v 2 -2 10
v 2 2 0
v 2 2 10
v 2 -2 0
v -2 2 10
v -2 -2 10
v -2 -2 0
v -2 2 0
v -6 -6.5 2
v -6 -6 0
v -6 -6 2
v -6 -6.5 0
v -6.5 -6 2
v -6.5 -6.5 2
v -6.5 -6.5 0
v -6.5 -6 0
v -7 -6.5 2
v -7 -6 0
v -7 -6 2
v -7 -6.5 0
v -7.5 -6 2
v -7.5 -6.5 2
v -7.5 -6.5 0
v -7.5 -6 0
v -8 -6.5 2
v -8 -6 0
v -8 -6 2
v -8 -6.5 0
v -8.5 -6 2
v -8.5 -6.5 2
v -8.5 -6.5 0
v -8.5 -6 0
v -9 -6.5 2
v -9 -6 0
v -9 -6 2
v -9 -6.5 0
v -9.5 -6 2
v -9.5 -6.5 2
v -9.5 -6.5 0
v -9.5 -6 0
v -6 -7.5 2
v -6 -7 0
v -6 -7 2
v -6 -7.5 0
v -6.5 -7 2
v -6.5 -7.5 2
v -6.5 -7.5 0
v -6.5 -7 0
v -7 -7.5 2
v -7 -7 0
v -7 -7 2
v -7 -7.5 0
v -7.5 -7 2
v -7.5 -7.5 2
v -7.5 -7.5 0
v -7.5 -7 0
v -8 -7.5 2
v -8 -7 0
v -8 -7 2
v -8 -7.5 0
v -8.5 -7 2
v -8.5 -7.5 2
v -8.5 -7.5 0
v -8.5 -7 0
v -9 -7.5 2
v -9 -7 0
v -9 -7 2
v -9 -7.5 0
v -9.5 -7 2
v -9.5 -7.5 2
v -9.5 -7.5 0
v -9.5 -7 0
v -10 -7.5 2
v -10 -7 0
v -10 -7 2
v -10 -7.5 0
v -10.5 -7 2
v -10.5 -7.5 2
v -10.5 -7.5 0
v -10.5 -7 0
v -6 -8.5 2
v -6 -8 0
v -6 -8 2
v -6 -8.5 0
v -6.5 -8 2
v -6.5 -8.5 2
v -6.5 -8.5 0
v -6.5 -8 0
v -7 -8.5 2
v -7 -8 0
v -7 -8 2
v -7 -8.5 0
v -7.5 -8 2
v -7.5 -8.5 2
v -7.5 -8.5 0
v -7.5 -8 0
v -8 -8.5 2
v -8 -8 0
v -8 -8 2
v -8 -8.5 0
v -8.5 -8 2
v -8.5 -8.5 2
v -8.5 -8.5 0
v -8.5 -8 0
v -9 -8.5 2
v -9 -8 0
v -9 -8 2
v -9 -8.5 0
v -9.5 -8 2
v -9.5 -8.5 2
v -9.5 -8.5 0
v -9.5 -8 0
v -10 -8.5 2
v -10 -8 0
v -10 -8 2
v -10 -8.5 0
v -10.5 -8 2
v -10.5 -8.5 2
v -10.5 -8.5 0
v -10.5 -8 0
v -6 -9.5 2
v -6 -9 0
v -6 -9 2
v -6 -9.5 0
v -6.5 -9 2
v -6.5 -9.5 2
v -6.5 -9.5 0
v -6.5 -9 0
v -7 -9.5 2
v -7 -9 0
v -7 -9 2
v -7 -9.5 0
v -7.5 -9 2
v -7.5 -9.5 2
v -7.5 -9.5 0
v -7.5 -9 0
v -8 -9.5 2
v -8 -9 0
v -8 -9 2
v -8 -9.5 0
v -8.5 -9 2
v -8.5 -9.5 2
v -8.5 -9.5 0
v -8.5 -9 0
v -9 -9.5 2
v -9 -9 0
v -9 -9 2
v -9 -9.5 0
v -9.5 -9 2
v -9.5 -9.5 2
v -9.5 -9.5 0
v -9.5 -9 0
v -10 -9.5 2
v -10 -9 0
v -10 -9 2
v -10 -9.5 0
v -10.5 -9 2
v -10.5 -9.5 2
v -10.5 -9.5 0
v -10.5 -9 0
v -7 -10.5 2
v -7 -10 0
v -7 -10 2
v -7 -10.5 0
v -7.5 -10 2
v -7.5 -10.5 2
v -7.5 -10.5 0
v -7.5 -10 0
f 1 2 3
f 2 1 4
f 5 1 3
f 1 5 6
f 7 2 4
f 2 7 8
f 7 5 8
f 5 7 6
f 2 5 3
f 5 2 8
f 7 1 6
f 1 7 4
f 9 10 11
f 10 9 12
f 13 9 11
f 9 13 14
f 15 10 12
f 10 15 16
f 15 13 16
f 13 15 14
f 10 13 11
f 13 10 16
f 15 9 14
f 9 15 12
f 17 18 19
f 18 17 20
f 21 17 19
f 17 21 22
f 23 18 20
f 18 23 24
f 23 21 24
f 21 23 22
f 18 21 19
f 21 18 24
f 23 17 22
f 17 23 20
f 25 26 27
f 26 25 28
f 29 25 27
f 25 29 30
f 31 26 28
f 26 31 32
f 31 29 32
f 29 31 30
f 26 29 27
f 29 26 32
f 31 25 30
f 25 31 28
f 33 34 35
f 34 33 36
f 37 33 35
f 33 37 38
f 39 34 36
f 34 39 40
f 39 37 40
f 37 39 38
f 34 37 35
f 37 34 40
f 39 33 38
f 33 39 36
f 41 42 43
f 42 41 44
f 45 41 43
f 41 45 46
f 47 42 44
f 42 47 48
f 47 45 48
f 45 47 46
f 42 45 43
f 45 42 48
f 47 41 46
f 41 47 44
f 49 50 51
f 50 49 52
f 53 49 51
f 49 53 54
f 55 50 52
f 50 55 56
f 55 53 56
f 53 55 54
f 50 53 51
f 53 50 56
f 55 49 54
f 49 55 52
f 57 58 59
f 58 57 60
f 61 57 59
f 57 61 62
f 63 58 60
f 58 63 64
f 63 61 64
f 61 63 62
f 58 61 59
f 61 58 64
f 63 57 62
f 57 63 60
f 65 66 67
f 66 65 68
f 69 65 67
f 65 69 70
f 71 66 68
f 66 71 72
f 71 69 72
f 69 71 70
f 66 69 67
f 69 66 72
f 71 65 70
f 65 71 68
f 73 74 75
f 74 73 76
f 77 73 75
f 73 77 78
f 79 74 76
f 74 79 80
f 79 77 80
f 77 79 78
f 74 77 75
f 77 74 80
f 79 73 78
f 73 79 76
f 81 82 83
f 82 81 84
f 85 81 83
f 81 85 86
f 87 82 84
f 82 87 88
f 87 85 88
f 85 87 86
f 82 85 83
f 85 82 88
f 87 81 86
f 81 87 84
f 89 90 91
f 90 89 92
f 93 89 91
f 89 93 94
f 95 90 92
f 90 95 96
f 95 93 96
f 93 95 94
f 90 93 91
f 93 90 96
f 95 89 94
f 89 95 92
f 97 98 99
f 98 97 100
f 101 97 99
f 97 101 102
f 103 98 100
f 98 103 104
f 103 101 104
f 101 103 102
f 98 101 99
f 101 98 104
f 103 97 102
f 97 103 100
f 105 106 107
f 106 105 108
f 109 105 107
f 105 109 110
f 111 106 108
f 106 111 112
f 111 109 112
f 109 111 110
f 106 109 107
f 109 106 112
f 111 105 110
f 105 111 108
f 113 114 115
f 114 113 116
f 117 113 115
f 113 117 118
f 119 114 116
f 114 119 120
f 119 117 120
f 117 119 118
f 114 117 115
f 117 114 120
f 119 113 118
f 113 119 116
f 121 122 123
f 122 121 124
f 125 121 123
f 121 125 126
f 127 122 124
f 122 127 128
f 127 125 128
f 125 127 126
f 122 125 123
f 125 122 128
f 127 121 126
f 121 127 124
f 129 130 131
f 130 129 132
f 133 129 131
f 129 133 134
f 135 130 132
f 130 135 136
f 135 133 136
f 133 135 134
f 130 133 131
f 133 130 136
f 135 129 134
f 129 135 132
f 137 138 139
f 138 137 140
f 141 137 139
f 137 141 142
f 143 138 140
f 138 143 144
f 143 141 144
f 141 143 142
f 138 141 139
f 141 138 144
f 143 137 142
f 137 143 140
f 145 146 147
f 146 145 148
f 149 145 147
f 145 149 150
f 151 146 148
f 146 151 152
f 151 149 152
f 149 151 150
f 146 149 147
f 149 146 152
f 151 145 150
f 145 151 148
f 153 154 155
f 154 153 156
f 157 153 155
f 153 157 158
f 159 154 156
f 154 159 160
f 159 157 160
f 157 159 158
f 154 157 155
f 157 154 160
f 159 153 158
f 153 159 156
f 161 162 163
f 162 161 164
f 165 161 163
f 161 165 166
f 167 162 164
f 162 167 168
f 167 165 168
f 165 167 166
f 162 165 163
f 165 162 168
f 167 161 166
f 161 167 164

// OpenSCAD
translate([0, 0, 5]) color([0,1,0,0.9]) cube([4, 4, 10], center=true);
translate([-6.25, -6.25, 1]) color([1,0,0]) cube([0.5, 0.5, 2], center=true);
translate([-7.25, -6.25, 1]) color([1,0,0]) cube([0.5, 0.5, 2], center=true);
translate([-8.25, -6.25, 1]) color([1,0,0]) cube([0.5, 0.5, 2], center=true);
translate([-9.25, -6.25, 1]) color([1,0,0]) cube([0.5, 0.5, 2], center=true);
translate([-6.25, -7.25, 1]) color([1,0,0]) cube([0.5, 0.5, 2], center=true);
translate([-7.25, -7.25, 1]) color([1,0,0]) cube([0.5, 0.5, 2], center=true);
translate([-8.25, -7.25, 1]) color([1,0,0]) cube([0.5, 0.5, 2], center=true);
translate([-9.25, -7.25, 1]) color([1,0,0]) cube([0.5, 0.5, 2], center=true);
translate([-10.25, -7.25, 1]) color([1,0,0]) cube([0.5, 0.5, 2], center=true);
translate([-6.25, -8.25, 1]) color([1,0,0]) cube([0.5, 0.5, 2], center=true);
translate([-7.25, -8.25, 1]) color([1,0,0]) cube([0.5, 0.5, 2], center=true);
translate([-8.25, -8.25, 1]) color([1,0,0]) cube([0.5, 0.5, 2], center=true);
translate([-9.25, -8.25, 1]) color([1,0,0]) cube([0.5, 0.5, 2], center=true);
translate([-10.25, -8.25, 1]) color([1,0,0]) cube([0.5, 0.5, 2], center=true);
translate([-6.25, -9.25, 1]) color([1,0,0]) cube([0.5, 0.5, 2], center=true);
translate([-7.25, -9.25, 1]) color([1,0,0]) cube([0.5, 0.5, 2], center=true);
translate([-8.25, -9.25, 1]) color([1,0,0]) cube([0.5, 0.5, 2], center=true);
translate([-9.25, -9.25, 1]) color([1,0,0]) cube([0.5, 0.5, 2], center=true);
translate([-10.25, -9.25, 1]) color([1,0,0]) cube([0.5, 0.5, 2], center=true);
translate([-7.25, -10.25, 1]) color([1,0,0]) cube([0.5, 0.5, 2], center=true);
